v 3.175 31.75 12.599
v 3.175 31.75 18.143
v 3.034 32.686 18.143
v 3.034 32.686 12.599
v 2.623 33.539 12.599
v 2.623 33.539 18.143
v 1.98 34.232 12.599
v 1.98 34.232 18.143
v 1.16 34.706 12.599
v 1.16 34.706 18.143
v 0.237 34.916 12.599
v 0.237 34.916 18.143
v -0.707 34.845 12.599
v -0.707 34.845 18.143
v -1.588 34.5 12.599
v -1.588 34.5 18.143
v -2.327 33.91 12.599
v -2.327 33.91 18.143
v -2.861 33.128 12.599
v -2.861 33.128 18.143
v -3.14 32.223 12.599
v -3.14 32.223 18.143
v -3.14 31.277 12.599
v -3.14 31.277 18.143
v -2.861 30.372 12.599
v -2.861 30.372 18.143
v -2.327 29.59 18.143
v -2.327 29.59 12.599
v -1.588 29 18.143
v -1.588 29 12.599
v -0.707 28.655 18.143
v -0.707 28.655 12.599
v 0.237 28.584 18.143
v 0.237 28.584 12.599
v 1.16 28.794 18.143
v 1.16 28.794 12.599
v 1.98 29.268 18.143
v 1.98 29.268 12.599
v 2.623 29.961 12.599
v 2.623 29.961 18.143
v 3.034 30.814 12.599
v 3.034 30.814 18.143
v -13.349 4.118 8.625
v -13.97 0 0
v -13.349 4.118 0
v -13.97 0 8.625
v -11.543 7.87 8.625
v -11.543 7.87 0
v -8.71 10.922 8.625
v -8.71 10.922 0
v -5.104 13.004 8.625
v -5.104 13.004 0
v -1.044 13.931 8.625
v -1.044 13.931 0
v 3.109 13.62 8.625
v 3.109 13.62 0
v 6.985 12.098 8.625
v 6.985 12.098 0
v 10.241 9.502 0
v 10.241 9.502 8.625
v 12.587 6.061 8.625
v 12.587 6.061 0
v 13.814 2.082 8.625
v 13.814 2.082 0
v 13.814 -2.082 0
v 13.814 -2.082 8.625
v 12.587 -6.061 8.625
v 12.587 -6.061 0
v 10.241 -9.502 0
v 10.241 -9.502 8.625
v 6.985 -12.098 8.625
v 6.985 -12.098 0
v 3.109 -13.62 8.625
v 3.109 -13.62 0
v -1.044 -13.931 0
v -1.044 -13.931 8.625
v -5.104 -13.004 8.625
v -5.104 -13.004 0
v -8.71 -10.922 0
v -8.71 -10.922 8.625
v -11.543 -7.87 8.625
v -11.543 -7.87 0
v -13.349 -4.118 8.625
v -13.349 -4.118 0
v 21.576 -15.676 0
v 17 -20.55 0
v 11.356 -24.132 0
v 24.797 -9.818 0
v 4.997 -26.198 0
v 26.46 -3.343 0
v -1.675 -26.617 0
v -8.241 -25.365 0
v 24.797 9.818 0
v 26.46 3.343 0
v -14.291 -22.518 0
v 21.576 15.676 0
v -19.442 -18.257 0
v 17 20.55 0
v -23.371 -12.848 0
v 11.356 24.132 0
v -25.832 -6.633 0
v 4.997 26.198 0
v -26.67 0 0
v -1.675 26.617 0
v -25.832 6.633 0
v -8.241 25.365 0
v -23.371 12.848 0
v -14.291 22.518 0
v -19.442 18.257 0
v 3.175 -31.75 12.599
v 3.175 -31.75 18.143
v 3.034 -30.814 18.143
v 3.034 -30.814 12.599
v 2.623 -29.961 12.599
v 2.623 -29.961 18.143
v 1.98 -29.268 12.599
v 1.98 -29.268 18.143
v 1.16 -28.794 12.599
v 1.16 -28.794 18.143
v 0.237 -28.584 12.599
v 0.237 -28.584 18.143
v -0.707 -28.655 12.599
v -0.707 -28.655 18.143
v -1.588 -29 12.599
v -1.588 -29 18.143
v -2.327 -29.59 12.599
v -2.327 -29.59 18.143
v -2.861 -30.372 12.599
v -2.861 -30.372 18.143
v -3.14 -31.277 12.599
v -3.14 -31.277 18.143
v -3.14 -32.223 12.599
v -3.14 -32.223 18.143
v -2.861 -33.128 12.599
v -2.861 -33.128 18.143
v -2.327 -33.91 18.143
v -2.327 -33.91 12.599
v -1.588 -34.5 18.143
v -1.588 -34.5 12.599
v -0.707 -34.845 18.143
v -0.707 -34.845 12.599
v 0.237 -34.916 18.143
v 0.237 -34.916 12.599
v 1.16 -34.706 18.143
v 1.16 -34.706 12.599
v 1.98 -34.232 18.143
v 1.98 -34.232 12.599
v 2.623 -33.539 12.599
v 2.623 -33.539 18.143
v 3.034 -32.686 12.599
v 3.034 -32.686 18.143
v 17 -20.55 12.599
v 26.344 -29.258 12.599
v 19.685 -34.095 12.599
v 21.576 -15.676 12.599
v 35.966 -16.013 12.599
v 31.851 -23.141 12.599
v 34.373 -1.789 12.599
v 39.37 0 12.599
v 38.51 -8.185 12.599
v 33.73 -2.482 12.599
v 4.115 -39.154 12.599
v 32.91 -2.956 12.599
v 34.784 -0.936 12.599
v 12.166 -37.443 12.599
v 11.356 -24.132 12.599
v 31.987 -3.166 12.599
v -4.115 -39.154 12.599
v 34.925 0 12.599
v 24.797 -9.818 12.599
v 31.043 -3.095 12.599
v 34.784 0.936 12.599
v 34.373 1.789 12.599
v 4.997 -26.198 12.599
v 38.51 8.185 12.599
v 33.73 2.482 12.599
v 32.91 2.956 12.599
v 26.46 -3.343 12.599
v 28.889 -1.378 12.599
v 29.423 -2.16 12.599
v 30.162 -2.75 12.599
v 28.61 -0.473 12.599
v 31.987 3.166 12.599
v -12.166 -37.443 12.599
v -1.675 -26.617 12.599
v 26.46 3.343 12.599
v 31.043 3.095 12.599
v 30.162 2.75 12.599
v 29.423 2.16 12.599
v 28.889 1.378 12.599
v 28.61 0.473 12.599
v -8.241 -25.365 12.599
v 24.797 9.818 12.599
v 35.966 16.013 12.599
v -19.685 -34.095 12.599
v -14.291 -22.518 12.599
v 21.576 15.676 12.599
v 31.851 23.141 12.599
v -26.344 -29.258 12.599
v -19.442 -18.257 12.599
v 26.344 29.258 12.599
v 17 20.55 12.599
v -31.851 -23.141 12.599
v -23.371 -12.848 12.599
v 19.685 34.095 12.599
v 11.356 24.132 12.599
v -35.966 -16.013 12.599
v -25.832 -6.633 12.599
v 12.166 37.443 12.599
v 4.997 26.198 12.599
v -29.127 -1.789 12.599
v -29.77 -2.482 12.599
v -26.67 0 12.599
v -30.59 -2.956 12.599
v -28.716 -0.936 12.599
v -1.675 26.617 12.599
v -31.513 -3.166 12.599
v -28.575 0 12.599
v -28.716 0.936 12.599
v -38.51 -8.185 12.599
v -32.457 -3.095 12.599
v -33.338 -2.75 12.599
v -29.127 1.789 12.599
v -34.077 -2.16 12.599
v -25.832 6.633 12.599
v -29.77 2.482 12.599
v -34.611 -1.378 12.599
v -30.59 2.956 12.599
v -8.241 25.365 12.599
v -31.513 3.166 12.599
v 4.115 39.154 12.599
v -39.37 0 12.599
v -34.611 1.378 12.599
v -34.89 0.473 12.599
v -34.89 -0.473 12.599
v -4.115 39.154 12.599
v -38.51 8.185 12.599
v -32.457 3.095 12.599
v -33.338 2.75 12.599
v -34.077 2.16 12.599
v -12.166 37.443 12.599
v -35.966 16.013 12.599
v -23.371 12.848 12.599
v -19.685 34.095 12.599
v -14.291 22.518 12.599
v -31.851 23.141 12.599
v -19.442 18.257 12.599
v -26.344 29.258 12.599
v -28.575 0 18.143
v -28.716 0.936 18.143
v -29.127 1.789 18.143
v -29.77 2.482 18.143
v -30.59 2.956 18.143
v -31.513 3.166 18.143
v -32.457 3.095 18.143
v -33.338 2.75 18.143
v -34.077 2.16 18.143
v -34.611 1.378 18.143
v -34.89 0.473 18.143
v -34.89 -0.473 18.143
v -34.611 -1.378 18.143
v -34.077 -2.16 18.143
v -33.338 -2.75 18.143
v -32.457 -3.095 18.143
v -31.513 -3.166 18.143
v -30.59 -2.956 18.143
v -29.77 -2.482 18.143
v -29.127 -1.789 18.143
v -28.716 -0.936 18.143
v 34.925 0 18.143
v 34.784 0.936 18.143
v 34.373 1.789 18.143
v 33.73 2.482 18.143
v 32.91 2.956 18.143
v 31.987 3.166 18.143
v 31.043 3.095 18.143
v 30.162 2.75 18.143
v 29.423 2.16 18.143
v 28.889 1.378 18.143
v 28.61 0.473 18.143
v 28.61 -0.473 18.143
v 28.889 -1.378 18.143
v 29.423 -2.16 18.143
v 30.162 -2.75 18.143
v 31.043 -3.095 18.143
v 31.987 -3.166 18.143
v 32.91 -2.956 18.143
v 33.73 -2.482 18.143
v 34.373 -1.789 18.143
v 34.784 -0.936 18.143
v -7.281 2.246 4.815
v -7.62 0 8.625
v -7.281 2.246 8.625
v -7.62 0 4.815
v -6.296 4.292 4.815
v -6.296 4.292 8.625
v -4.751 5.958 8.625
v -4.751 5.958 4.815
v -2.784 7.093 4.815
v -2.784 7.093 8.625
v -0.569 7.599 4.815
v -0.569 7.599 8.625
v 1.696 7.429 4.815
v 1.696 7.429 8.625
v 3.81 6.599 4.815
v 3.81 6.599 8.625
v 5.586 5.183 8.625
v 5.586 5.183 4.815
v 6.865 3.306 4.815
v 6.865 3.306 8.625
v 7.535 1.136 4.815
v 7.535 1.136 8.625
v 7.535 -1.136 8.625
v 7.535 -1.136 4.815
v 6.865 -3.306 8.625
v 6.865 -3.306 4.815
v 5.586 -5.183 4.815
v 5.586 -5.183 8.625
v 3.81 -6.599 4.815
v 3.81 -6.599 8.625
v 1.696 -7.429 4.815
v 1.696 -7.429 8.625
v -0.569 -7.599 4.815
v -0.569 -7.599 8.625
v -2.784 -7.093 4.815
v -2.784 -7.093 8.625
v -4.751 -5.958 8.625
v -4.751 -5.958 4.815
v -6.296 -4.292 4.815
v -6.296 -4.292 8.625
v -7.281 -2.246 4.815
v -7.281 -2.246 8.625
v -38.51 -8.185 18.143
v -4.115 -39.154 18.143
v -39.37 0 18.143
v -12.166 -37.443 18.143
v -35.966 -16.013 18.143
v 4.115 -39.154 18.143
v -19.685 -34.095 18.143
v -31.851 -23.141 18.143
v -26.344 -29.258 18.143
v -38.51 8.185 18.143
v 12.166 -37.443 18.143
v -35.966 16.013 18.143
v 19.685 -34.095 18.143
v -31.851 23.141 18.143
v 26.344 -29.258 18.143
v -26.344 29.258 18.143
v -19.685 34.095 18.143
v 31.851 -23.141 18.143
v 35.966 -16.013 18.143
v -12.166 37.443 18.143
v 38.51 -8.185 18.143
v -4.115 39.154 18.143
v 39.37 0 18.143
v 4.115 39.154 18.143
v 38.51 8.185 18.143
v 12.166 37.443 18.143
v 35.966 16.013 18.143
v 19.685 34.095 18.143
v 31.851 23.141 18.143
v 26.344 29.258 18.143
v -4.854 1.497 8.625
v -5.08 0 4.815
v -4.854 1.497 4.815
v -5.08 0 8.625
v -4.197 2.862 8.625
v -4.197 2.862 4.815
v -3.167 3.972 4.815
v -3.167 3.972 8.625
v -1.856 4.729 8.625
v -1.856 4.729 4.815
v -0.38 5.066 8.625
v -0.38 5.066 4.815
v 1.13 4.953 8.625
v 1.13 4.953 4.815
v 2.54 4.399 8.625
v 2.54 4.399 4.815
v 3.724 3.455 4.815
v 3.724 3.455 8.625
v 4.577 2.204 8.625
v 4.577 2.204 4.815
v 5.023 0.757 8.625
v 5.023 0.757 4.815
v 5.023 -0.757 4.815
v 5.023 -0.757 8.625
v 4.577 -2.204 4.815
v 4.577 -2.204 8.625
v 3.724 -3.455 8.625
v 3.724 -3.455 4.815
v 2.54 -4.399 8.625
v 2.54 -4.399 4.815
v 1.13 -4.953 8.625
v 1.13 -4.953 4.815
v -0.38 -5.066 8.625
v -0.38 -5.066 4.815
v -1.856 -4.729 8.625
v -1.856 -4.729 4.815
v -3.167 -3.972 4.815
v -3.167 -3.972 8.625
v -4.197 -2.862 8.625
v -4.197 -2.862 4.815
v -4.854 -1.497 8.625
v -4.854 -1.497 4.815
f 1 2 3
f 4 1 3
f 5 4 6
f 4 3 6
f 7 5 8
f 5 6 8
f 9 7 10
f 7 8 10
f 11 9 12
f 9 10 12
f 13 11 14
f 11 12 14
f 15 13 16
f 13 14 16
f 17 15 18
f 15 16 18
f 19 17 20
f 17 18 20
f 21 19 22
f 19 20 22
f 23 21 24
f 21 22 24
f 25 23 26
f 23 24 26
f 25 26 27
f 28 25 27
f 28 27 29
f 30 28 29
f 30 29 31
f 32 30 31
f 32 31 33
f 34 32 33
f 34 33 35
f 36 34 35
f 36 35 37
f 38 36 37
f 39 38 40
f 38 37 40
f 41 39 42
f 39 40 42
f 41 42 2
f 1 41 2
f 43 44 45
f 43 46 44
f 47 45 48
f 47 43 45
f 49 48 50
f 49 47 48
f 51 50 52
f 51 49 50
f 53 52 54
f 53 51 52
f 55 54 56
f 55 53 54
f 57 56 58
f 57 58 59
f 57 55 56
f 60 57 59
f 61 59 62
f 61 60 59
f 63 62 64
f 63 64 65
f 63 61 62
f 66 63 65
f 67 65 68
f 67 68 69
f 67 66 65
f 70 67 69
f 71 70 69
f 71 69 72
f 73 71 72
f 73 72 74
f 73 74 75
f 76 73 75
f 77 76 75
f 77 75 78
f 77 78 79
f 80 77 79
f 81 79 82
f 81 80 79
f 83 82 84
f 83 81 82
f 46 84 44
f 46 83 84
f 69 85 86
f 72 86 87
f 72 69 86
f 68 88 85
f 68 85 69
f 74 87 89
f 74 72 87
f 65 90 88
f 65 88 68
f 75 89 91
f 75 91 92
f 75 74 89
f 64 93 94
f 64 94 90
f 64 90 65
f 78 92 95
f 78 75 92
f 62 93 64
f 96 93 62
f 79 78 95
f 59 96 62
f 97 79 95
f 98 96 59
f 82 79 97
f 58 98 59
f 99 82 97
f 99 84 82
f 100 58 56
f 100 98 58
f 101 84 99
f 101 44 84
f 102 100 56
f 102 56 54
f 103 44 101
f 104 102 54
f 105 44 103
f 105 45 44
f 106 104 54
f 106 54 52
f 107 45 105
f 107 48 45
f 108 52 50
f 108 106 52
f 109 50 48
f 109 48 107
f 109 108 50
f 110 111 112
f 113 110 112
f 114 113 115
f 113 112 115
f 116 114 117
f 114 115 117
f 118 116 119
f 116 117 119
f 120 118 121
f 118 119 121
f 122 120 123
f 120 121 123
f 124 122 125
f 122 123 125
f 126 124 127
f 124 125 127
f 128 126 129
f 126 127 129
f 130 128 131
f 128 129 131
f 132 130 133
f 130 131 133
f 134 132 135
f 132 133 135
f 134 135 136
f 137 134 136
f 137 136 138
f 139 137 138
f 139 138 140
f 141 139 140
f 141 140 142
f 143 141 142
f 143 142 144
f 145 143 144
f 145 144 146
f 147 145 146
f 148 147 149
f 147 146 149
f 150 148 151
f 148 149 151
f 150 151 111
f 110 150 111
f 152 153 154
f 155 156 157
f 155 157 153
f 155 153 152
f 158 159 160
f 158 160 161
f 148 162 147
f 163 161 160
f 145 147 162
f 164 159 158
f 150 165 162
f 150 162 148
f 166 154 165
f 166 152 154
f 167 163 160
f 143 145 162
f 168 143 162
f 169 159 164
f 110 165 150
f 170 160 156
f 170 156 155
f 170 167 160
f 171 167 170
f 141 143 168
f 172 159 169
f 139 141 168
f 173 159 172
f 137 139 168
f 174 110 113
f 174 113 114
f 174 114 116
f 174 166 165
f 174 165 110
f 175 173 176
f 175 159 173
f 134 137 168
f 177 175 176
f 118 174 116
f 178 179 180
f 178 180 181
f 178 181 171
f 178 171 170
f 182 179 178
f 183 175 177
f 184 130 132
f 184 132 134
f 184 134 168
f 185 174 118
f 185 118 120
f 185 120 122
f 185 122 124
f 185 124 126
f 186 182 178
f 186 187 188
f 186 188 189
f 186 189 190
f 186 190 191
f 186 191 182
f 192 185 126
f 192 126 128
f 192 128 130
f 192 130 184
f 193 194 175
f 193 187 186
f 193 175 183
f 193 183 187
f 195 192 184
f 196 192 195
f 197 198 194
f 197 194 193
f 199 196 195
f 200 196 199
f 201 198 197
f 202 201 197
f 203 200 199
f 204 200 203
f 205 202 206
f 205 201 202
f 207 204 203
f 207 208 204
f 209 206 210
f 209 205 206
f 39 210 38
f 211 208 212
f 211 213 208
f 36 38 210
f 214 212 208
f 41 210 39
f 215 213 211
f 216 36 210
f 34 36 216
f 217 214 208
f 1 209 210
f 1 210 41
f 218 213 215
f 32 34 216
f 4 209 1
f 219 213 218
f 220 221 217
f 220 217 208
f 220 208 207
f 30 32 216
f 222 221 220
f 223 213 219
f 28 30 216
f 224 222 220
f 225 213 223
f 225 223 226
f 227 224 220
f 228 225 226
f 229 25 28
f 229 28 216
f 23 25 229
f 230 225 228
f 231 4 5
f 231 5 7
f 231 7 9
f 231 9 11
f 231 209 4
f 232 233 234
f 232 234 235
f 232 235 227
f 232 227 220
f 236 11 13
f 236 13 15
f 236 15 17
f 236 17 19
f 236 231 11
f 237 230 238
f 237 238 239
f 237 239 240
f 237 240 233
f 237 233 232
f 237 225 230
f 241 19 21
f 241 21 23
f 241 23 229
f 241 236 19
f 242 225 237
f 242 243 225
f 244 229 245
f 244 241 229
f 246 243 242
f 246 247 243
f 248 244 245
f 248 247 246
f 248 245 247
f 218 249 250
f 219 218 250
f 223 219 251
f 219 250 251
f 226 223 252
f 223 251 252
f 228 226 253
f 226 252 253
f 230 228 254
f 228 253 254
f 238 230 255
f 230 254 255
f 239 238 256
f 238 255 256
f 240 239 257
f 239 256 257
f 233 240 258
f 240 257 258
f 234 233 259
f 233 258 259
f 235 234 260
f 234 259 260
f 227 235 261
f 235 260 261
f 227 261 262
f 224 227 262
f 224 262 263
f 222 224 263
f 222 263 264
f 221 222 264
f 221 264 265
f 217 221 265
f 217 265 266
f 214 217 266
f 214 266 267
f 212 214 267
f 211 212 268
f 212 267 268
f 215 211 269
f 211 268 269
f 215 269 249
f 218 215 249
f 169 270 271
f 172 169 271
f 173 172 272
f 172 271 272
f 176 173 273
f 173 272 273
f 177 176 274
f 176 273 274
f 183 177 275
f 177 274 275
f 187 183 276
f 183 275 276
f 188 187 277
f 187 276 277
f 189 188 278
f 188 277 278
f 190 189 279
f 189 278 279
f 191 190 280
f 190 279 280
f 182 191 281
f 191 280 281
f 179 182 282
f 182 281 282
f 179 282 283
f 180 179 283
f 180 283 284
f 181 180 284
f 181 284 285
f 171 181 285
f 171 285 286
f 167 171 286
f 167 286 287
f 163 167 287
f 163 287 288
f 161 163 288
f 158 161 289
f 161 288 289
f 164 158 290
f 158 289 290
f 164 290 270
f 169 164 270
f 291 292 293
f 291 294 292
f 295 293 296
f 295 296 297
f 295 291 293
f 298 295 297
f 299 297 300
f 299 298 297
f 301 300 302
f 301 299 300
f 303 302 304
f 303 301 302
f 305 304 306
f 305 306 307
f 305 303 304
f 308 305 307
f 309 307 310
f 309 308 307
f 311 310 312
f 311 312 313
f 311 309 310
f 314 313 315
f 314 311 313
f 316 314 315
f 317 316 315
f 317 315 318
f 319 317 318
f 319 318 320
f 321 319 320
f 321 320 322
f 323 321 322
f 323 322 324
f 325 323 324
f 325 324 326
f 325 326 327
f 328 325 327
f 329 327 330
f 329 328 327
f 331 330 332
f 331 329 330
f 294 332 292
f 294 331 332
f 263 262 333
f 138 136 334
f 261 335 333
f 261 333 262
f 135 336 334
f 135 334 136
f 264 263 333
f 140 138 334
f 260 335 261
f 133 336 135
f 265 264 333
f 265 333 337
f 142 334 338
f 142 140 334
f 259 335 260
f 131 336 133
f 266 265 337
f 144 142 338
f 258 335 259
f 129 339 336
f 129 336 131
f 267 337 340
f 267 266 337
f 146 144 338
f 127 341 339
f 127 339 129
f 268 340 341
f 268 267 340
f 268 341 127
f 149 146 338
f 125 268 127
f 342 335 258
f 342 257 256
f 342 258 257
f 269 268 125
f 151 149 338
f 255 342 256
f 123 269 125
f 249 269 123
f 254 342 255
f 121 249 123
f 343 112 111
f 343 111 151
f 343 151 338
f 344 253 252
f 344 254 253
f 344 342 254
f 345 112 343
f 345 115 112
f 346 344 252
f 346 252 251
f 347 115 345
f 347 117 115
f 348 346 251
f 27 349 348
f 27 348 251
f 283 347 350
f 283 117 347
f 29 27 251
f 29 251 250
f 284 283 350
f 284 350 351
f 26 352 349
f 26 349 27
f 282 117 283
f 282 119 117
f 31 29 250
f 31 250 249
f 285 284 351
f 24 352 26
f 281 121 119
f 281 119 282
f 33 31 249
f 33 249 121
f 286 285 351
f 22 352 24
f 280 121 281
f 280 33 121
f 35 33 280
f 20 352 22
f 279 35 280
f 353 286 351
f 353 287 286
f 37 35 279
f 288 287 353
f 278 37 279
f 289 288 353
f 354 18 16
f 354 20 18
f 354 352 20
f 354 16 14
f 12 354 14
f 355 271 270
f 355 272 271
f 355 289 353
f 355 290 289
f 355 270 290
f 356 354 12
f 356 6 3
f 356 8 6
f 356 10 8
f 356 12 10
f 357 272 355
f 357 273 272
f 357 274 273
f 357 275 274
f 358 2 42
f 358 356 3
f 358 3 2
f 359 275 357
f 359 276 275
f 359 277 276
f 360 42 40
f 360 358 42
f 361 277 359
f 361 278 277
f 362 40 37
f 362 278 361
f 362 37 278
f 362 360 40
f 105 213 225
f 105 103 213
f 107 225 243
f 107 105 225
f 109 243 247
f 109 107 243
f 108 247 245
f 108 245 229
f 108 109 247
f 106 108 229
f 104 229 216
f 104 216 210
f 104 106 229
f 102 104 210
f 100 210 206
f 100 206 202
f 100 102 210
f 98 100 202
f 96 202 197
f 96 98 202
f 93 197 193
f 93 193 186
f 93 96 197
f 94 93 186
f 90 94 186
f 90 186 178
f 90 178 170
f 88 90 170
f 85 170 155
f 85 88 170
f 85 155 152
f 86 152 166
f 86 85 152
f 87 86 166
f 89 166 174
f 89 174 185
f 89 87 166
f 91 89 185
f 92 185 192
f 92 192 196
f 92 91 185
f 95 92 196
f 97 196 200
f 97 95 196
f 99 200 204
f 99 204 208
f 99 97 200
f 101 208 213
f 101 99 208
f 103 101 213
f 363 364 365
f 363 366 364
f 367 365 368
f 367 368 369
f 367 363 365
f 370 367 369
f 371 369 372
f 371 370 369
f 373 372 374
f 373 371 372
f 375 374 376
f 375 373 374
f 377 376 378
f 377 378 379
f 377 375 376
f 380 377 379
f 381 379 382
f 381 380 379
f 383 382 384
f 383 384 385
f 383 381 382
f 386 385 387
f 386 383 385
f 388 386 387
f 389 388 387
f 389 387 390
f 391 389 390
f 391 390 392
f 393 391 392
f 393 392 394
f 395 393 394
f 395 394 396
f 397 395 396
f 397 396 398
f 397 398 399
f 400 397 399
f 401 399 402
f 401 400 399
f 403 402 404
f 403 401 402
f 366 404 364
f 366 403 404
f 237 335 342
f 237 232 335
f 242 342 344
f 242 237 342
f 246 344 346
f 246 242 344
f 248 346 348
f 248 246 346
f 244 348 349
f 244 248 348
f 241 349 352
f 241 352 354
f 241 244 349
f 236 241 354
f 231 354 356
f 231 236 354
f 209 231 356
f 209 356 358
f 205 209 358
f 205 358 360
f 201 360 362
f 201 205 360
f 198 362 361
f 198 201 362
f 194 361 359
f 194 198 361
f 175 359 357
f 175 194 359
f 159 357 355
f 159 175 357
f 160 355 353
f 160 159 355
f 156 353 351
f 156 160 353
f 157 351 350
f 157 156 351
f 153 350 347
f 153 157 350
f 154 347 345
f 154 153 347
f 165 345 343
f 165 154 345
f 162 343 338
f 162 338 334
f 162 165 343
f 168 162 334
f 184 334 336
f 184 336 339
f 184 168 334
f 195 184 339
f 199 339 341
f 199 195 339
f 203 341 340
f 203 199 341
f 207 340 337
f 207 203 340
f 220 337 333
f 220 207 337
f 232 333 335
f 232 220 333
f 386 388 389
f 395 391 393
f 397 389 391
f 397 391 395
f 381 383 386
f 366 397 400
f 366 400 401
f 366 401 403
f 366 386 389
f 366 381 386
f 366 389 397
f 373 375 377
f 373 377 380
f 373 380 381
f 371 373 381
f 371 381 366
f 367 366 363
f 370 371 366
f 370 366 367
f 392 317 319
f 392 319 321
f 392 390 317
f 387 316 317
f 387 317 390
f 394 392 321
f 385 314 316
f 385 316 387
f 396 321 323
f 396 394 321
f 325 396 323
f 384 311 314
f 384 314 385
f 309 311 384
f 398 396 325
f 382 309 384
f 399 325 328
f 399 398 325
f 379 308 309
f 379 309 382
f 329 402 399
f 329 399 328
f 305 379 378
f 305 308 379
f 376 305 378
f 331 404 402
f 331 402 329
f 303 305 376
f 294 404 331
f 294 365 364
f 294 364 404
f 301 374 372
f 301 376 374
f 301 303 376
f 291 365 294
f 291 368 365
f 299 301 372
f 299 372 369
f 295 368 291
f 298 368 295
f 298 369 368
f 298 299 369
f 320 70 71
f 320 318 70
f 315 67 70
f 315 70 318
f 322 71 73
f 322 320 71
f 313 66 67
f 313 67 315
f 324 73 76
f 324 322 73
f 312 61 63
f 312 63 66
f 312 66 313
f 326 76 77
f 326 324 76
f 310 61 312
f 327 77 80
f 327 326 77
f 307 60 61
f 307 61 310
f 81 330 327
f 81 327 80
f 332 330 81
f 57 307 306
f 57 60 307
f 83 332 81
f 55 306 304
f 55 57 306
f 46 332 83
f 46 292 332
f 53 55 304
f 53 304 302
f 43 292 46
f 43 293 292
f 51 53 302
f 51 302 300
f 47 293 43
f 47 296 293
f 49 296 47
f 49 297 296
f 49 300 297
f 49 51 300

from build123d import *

# Parameters (mm, degrees)
F2_R     = 3.175
F3_DEPTH = 5.54365


with BuildPart() as f1:
    # F0 (on Front) → F1 (revolve)
    with BuildSketch(Plane.XZ):
        Polygon((0, 8.62508), (0, 18.142857), (-39.37, 18.142857), (-39.37, 12.599207), (-26.67, 12.599207), (-26.67, 4.938889), (-26.67, 0), (-13.97, 0), (-13.97, 8.62508), (-7.62, 8.62508), (-7.62, 4.81508), (-5.08, 4.81508), (-5.08, 8.62508), align=None)
    revolve(axis=Axis((0, 0, 21.598651), (0, 0, -1)))

    # F2 (on face) → F3 (cut, through all)
    with BuildSketch(Plane.XY.offset(18.142857)):
        with Locations((0, 31.75)):
            Circle(F2_R)
        with Locations((31.75, 0)):
            Circle(F2_R)
        with Locations((0, -31.75)):
            Circle(F2_R)
        with Locations((-31.75, 0)):
            Circle(F2_R)
    extrude(amount=-F3_DEPTH, mode=Mode.SUBTRACT)


solid = f1.part
